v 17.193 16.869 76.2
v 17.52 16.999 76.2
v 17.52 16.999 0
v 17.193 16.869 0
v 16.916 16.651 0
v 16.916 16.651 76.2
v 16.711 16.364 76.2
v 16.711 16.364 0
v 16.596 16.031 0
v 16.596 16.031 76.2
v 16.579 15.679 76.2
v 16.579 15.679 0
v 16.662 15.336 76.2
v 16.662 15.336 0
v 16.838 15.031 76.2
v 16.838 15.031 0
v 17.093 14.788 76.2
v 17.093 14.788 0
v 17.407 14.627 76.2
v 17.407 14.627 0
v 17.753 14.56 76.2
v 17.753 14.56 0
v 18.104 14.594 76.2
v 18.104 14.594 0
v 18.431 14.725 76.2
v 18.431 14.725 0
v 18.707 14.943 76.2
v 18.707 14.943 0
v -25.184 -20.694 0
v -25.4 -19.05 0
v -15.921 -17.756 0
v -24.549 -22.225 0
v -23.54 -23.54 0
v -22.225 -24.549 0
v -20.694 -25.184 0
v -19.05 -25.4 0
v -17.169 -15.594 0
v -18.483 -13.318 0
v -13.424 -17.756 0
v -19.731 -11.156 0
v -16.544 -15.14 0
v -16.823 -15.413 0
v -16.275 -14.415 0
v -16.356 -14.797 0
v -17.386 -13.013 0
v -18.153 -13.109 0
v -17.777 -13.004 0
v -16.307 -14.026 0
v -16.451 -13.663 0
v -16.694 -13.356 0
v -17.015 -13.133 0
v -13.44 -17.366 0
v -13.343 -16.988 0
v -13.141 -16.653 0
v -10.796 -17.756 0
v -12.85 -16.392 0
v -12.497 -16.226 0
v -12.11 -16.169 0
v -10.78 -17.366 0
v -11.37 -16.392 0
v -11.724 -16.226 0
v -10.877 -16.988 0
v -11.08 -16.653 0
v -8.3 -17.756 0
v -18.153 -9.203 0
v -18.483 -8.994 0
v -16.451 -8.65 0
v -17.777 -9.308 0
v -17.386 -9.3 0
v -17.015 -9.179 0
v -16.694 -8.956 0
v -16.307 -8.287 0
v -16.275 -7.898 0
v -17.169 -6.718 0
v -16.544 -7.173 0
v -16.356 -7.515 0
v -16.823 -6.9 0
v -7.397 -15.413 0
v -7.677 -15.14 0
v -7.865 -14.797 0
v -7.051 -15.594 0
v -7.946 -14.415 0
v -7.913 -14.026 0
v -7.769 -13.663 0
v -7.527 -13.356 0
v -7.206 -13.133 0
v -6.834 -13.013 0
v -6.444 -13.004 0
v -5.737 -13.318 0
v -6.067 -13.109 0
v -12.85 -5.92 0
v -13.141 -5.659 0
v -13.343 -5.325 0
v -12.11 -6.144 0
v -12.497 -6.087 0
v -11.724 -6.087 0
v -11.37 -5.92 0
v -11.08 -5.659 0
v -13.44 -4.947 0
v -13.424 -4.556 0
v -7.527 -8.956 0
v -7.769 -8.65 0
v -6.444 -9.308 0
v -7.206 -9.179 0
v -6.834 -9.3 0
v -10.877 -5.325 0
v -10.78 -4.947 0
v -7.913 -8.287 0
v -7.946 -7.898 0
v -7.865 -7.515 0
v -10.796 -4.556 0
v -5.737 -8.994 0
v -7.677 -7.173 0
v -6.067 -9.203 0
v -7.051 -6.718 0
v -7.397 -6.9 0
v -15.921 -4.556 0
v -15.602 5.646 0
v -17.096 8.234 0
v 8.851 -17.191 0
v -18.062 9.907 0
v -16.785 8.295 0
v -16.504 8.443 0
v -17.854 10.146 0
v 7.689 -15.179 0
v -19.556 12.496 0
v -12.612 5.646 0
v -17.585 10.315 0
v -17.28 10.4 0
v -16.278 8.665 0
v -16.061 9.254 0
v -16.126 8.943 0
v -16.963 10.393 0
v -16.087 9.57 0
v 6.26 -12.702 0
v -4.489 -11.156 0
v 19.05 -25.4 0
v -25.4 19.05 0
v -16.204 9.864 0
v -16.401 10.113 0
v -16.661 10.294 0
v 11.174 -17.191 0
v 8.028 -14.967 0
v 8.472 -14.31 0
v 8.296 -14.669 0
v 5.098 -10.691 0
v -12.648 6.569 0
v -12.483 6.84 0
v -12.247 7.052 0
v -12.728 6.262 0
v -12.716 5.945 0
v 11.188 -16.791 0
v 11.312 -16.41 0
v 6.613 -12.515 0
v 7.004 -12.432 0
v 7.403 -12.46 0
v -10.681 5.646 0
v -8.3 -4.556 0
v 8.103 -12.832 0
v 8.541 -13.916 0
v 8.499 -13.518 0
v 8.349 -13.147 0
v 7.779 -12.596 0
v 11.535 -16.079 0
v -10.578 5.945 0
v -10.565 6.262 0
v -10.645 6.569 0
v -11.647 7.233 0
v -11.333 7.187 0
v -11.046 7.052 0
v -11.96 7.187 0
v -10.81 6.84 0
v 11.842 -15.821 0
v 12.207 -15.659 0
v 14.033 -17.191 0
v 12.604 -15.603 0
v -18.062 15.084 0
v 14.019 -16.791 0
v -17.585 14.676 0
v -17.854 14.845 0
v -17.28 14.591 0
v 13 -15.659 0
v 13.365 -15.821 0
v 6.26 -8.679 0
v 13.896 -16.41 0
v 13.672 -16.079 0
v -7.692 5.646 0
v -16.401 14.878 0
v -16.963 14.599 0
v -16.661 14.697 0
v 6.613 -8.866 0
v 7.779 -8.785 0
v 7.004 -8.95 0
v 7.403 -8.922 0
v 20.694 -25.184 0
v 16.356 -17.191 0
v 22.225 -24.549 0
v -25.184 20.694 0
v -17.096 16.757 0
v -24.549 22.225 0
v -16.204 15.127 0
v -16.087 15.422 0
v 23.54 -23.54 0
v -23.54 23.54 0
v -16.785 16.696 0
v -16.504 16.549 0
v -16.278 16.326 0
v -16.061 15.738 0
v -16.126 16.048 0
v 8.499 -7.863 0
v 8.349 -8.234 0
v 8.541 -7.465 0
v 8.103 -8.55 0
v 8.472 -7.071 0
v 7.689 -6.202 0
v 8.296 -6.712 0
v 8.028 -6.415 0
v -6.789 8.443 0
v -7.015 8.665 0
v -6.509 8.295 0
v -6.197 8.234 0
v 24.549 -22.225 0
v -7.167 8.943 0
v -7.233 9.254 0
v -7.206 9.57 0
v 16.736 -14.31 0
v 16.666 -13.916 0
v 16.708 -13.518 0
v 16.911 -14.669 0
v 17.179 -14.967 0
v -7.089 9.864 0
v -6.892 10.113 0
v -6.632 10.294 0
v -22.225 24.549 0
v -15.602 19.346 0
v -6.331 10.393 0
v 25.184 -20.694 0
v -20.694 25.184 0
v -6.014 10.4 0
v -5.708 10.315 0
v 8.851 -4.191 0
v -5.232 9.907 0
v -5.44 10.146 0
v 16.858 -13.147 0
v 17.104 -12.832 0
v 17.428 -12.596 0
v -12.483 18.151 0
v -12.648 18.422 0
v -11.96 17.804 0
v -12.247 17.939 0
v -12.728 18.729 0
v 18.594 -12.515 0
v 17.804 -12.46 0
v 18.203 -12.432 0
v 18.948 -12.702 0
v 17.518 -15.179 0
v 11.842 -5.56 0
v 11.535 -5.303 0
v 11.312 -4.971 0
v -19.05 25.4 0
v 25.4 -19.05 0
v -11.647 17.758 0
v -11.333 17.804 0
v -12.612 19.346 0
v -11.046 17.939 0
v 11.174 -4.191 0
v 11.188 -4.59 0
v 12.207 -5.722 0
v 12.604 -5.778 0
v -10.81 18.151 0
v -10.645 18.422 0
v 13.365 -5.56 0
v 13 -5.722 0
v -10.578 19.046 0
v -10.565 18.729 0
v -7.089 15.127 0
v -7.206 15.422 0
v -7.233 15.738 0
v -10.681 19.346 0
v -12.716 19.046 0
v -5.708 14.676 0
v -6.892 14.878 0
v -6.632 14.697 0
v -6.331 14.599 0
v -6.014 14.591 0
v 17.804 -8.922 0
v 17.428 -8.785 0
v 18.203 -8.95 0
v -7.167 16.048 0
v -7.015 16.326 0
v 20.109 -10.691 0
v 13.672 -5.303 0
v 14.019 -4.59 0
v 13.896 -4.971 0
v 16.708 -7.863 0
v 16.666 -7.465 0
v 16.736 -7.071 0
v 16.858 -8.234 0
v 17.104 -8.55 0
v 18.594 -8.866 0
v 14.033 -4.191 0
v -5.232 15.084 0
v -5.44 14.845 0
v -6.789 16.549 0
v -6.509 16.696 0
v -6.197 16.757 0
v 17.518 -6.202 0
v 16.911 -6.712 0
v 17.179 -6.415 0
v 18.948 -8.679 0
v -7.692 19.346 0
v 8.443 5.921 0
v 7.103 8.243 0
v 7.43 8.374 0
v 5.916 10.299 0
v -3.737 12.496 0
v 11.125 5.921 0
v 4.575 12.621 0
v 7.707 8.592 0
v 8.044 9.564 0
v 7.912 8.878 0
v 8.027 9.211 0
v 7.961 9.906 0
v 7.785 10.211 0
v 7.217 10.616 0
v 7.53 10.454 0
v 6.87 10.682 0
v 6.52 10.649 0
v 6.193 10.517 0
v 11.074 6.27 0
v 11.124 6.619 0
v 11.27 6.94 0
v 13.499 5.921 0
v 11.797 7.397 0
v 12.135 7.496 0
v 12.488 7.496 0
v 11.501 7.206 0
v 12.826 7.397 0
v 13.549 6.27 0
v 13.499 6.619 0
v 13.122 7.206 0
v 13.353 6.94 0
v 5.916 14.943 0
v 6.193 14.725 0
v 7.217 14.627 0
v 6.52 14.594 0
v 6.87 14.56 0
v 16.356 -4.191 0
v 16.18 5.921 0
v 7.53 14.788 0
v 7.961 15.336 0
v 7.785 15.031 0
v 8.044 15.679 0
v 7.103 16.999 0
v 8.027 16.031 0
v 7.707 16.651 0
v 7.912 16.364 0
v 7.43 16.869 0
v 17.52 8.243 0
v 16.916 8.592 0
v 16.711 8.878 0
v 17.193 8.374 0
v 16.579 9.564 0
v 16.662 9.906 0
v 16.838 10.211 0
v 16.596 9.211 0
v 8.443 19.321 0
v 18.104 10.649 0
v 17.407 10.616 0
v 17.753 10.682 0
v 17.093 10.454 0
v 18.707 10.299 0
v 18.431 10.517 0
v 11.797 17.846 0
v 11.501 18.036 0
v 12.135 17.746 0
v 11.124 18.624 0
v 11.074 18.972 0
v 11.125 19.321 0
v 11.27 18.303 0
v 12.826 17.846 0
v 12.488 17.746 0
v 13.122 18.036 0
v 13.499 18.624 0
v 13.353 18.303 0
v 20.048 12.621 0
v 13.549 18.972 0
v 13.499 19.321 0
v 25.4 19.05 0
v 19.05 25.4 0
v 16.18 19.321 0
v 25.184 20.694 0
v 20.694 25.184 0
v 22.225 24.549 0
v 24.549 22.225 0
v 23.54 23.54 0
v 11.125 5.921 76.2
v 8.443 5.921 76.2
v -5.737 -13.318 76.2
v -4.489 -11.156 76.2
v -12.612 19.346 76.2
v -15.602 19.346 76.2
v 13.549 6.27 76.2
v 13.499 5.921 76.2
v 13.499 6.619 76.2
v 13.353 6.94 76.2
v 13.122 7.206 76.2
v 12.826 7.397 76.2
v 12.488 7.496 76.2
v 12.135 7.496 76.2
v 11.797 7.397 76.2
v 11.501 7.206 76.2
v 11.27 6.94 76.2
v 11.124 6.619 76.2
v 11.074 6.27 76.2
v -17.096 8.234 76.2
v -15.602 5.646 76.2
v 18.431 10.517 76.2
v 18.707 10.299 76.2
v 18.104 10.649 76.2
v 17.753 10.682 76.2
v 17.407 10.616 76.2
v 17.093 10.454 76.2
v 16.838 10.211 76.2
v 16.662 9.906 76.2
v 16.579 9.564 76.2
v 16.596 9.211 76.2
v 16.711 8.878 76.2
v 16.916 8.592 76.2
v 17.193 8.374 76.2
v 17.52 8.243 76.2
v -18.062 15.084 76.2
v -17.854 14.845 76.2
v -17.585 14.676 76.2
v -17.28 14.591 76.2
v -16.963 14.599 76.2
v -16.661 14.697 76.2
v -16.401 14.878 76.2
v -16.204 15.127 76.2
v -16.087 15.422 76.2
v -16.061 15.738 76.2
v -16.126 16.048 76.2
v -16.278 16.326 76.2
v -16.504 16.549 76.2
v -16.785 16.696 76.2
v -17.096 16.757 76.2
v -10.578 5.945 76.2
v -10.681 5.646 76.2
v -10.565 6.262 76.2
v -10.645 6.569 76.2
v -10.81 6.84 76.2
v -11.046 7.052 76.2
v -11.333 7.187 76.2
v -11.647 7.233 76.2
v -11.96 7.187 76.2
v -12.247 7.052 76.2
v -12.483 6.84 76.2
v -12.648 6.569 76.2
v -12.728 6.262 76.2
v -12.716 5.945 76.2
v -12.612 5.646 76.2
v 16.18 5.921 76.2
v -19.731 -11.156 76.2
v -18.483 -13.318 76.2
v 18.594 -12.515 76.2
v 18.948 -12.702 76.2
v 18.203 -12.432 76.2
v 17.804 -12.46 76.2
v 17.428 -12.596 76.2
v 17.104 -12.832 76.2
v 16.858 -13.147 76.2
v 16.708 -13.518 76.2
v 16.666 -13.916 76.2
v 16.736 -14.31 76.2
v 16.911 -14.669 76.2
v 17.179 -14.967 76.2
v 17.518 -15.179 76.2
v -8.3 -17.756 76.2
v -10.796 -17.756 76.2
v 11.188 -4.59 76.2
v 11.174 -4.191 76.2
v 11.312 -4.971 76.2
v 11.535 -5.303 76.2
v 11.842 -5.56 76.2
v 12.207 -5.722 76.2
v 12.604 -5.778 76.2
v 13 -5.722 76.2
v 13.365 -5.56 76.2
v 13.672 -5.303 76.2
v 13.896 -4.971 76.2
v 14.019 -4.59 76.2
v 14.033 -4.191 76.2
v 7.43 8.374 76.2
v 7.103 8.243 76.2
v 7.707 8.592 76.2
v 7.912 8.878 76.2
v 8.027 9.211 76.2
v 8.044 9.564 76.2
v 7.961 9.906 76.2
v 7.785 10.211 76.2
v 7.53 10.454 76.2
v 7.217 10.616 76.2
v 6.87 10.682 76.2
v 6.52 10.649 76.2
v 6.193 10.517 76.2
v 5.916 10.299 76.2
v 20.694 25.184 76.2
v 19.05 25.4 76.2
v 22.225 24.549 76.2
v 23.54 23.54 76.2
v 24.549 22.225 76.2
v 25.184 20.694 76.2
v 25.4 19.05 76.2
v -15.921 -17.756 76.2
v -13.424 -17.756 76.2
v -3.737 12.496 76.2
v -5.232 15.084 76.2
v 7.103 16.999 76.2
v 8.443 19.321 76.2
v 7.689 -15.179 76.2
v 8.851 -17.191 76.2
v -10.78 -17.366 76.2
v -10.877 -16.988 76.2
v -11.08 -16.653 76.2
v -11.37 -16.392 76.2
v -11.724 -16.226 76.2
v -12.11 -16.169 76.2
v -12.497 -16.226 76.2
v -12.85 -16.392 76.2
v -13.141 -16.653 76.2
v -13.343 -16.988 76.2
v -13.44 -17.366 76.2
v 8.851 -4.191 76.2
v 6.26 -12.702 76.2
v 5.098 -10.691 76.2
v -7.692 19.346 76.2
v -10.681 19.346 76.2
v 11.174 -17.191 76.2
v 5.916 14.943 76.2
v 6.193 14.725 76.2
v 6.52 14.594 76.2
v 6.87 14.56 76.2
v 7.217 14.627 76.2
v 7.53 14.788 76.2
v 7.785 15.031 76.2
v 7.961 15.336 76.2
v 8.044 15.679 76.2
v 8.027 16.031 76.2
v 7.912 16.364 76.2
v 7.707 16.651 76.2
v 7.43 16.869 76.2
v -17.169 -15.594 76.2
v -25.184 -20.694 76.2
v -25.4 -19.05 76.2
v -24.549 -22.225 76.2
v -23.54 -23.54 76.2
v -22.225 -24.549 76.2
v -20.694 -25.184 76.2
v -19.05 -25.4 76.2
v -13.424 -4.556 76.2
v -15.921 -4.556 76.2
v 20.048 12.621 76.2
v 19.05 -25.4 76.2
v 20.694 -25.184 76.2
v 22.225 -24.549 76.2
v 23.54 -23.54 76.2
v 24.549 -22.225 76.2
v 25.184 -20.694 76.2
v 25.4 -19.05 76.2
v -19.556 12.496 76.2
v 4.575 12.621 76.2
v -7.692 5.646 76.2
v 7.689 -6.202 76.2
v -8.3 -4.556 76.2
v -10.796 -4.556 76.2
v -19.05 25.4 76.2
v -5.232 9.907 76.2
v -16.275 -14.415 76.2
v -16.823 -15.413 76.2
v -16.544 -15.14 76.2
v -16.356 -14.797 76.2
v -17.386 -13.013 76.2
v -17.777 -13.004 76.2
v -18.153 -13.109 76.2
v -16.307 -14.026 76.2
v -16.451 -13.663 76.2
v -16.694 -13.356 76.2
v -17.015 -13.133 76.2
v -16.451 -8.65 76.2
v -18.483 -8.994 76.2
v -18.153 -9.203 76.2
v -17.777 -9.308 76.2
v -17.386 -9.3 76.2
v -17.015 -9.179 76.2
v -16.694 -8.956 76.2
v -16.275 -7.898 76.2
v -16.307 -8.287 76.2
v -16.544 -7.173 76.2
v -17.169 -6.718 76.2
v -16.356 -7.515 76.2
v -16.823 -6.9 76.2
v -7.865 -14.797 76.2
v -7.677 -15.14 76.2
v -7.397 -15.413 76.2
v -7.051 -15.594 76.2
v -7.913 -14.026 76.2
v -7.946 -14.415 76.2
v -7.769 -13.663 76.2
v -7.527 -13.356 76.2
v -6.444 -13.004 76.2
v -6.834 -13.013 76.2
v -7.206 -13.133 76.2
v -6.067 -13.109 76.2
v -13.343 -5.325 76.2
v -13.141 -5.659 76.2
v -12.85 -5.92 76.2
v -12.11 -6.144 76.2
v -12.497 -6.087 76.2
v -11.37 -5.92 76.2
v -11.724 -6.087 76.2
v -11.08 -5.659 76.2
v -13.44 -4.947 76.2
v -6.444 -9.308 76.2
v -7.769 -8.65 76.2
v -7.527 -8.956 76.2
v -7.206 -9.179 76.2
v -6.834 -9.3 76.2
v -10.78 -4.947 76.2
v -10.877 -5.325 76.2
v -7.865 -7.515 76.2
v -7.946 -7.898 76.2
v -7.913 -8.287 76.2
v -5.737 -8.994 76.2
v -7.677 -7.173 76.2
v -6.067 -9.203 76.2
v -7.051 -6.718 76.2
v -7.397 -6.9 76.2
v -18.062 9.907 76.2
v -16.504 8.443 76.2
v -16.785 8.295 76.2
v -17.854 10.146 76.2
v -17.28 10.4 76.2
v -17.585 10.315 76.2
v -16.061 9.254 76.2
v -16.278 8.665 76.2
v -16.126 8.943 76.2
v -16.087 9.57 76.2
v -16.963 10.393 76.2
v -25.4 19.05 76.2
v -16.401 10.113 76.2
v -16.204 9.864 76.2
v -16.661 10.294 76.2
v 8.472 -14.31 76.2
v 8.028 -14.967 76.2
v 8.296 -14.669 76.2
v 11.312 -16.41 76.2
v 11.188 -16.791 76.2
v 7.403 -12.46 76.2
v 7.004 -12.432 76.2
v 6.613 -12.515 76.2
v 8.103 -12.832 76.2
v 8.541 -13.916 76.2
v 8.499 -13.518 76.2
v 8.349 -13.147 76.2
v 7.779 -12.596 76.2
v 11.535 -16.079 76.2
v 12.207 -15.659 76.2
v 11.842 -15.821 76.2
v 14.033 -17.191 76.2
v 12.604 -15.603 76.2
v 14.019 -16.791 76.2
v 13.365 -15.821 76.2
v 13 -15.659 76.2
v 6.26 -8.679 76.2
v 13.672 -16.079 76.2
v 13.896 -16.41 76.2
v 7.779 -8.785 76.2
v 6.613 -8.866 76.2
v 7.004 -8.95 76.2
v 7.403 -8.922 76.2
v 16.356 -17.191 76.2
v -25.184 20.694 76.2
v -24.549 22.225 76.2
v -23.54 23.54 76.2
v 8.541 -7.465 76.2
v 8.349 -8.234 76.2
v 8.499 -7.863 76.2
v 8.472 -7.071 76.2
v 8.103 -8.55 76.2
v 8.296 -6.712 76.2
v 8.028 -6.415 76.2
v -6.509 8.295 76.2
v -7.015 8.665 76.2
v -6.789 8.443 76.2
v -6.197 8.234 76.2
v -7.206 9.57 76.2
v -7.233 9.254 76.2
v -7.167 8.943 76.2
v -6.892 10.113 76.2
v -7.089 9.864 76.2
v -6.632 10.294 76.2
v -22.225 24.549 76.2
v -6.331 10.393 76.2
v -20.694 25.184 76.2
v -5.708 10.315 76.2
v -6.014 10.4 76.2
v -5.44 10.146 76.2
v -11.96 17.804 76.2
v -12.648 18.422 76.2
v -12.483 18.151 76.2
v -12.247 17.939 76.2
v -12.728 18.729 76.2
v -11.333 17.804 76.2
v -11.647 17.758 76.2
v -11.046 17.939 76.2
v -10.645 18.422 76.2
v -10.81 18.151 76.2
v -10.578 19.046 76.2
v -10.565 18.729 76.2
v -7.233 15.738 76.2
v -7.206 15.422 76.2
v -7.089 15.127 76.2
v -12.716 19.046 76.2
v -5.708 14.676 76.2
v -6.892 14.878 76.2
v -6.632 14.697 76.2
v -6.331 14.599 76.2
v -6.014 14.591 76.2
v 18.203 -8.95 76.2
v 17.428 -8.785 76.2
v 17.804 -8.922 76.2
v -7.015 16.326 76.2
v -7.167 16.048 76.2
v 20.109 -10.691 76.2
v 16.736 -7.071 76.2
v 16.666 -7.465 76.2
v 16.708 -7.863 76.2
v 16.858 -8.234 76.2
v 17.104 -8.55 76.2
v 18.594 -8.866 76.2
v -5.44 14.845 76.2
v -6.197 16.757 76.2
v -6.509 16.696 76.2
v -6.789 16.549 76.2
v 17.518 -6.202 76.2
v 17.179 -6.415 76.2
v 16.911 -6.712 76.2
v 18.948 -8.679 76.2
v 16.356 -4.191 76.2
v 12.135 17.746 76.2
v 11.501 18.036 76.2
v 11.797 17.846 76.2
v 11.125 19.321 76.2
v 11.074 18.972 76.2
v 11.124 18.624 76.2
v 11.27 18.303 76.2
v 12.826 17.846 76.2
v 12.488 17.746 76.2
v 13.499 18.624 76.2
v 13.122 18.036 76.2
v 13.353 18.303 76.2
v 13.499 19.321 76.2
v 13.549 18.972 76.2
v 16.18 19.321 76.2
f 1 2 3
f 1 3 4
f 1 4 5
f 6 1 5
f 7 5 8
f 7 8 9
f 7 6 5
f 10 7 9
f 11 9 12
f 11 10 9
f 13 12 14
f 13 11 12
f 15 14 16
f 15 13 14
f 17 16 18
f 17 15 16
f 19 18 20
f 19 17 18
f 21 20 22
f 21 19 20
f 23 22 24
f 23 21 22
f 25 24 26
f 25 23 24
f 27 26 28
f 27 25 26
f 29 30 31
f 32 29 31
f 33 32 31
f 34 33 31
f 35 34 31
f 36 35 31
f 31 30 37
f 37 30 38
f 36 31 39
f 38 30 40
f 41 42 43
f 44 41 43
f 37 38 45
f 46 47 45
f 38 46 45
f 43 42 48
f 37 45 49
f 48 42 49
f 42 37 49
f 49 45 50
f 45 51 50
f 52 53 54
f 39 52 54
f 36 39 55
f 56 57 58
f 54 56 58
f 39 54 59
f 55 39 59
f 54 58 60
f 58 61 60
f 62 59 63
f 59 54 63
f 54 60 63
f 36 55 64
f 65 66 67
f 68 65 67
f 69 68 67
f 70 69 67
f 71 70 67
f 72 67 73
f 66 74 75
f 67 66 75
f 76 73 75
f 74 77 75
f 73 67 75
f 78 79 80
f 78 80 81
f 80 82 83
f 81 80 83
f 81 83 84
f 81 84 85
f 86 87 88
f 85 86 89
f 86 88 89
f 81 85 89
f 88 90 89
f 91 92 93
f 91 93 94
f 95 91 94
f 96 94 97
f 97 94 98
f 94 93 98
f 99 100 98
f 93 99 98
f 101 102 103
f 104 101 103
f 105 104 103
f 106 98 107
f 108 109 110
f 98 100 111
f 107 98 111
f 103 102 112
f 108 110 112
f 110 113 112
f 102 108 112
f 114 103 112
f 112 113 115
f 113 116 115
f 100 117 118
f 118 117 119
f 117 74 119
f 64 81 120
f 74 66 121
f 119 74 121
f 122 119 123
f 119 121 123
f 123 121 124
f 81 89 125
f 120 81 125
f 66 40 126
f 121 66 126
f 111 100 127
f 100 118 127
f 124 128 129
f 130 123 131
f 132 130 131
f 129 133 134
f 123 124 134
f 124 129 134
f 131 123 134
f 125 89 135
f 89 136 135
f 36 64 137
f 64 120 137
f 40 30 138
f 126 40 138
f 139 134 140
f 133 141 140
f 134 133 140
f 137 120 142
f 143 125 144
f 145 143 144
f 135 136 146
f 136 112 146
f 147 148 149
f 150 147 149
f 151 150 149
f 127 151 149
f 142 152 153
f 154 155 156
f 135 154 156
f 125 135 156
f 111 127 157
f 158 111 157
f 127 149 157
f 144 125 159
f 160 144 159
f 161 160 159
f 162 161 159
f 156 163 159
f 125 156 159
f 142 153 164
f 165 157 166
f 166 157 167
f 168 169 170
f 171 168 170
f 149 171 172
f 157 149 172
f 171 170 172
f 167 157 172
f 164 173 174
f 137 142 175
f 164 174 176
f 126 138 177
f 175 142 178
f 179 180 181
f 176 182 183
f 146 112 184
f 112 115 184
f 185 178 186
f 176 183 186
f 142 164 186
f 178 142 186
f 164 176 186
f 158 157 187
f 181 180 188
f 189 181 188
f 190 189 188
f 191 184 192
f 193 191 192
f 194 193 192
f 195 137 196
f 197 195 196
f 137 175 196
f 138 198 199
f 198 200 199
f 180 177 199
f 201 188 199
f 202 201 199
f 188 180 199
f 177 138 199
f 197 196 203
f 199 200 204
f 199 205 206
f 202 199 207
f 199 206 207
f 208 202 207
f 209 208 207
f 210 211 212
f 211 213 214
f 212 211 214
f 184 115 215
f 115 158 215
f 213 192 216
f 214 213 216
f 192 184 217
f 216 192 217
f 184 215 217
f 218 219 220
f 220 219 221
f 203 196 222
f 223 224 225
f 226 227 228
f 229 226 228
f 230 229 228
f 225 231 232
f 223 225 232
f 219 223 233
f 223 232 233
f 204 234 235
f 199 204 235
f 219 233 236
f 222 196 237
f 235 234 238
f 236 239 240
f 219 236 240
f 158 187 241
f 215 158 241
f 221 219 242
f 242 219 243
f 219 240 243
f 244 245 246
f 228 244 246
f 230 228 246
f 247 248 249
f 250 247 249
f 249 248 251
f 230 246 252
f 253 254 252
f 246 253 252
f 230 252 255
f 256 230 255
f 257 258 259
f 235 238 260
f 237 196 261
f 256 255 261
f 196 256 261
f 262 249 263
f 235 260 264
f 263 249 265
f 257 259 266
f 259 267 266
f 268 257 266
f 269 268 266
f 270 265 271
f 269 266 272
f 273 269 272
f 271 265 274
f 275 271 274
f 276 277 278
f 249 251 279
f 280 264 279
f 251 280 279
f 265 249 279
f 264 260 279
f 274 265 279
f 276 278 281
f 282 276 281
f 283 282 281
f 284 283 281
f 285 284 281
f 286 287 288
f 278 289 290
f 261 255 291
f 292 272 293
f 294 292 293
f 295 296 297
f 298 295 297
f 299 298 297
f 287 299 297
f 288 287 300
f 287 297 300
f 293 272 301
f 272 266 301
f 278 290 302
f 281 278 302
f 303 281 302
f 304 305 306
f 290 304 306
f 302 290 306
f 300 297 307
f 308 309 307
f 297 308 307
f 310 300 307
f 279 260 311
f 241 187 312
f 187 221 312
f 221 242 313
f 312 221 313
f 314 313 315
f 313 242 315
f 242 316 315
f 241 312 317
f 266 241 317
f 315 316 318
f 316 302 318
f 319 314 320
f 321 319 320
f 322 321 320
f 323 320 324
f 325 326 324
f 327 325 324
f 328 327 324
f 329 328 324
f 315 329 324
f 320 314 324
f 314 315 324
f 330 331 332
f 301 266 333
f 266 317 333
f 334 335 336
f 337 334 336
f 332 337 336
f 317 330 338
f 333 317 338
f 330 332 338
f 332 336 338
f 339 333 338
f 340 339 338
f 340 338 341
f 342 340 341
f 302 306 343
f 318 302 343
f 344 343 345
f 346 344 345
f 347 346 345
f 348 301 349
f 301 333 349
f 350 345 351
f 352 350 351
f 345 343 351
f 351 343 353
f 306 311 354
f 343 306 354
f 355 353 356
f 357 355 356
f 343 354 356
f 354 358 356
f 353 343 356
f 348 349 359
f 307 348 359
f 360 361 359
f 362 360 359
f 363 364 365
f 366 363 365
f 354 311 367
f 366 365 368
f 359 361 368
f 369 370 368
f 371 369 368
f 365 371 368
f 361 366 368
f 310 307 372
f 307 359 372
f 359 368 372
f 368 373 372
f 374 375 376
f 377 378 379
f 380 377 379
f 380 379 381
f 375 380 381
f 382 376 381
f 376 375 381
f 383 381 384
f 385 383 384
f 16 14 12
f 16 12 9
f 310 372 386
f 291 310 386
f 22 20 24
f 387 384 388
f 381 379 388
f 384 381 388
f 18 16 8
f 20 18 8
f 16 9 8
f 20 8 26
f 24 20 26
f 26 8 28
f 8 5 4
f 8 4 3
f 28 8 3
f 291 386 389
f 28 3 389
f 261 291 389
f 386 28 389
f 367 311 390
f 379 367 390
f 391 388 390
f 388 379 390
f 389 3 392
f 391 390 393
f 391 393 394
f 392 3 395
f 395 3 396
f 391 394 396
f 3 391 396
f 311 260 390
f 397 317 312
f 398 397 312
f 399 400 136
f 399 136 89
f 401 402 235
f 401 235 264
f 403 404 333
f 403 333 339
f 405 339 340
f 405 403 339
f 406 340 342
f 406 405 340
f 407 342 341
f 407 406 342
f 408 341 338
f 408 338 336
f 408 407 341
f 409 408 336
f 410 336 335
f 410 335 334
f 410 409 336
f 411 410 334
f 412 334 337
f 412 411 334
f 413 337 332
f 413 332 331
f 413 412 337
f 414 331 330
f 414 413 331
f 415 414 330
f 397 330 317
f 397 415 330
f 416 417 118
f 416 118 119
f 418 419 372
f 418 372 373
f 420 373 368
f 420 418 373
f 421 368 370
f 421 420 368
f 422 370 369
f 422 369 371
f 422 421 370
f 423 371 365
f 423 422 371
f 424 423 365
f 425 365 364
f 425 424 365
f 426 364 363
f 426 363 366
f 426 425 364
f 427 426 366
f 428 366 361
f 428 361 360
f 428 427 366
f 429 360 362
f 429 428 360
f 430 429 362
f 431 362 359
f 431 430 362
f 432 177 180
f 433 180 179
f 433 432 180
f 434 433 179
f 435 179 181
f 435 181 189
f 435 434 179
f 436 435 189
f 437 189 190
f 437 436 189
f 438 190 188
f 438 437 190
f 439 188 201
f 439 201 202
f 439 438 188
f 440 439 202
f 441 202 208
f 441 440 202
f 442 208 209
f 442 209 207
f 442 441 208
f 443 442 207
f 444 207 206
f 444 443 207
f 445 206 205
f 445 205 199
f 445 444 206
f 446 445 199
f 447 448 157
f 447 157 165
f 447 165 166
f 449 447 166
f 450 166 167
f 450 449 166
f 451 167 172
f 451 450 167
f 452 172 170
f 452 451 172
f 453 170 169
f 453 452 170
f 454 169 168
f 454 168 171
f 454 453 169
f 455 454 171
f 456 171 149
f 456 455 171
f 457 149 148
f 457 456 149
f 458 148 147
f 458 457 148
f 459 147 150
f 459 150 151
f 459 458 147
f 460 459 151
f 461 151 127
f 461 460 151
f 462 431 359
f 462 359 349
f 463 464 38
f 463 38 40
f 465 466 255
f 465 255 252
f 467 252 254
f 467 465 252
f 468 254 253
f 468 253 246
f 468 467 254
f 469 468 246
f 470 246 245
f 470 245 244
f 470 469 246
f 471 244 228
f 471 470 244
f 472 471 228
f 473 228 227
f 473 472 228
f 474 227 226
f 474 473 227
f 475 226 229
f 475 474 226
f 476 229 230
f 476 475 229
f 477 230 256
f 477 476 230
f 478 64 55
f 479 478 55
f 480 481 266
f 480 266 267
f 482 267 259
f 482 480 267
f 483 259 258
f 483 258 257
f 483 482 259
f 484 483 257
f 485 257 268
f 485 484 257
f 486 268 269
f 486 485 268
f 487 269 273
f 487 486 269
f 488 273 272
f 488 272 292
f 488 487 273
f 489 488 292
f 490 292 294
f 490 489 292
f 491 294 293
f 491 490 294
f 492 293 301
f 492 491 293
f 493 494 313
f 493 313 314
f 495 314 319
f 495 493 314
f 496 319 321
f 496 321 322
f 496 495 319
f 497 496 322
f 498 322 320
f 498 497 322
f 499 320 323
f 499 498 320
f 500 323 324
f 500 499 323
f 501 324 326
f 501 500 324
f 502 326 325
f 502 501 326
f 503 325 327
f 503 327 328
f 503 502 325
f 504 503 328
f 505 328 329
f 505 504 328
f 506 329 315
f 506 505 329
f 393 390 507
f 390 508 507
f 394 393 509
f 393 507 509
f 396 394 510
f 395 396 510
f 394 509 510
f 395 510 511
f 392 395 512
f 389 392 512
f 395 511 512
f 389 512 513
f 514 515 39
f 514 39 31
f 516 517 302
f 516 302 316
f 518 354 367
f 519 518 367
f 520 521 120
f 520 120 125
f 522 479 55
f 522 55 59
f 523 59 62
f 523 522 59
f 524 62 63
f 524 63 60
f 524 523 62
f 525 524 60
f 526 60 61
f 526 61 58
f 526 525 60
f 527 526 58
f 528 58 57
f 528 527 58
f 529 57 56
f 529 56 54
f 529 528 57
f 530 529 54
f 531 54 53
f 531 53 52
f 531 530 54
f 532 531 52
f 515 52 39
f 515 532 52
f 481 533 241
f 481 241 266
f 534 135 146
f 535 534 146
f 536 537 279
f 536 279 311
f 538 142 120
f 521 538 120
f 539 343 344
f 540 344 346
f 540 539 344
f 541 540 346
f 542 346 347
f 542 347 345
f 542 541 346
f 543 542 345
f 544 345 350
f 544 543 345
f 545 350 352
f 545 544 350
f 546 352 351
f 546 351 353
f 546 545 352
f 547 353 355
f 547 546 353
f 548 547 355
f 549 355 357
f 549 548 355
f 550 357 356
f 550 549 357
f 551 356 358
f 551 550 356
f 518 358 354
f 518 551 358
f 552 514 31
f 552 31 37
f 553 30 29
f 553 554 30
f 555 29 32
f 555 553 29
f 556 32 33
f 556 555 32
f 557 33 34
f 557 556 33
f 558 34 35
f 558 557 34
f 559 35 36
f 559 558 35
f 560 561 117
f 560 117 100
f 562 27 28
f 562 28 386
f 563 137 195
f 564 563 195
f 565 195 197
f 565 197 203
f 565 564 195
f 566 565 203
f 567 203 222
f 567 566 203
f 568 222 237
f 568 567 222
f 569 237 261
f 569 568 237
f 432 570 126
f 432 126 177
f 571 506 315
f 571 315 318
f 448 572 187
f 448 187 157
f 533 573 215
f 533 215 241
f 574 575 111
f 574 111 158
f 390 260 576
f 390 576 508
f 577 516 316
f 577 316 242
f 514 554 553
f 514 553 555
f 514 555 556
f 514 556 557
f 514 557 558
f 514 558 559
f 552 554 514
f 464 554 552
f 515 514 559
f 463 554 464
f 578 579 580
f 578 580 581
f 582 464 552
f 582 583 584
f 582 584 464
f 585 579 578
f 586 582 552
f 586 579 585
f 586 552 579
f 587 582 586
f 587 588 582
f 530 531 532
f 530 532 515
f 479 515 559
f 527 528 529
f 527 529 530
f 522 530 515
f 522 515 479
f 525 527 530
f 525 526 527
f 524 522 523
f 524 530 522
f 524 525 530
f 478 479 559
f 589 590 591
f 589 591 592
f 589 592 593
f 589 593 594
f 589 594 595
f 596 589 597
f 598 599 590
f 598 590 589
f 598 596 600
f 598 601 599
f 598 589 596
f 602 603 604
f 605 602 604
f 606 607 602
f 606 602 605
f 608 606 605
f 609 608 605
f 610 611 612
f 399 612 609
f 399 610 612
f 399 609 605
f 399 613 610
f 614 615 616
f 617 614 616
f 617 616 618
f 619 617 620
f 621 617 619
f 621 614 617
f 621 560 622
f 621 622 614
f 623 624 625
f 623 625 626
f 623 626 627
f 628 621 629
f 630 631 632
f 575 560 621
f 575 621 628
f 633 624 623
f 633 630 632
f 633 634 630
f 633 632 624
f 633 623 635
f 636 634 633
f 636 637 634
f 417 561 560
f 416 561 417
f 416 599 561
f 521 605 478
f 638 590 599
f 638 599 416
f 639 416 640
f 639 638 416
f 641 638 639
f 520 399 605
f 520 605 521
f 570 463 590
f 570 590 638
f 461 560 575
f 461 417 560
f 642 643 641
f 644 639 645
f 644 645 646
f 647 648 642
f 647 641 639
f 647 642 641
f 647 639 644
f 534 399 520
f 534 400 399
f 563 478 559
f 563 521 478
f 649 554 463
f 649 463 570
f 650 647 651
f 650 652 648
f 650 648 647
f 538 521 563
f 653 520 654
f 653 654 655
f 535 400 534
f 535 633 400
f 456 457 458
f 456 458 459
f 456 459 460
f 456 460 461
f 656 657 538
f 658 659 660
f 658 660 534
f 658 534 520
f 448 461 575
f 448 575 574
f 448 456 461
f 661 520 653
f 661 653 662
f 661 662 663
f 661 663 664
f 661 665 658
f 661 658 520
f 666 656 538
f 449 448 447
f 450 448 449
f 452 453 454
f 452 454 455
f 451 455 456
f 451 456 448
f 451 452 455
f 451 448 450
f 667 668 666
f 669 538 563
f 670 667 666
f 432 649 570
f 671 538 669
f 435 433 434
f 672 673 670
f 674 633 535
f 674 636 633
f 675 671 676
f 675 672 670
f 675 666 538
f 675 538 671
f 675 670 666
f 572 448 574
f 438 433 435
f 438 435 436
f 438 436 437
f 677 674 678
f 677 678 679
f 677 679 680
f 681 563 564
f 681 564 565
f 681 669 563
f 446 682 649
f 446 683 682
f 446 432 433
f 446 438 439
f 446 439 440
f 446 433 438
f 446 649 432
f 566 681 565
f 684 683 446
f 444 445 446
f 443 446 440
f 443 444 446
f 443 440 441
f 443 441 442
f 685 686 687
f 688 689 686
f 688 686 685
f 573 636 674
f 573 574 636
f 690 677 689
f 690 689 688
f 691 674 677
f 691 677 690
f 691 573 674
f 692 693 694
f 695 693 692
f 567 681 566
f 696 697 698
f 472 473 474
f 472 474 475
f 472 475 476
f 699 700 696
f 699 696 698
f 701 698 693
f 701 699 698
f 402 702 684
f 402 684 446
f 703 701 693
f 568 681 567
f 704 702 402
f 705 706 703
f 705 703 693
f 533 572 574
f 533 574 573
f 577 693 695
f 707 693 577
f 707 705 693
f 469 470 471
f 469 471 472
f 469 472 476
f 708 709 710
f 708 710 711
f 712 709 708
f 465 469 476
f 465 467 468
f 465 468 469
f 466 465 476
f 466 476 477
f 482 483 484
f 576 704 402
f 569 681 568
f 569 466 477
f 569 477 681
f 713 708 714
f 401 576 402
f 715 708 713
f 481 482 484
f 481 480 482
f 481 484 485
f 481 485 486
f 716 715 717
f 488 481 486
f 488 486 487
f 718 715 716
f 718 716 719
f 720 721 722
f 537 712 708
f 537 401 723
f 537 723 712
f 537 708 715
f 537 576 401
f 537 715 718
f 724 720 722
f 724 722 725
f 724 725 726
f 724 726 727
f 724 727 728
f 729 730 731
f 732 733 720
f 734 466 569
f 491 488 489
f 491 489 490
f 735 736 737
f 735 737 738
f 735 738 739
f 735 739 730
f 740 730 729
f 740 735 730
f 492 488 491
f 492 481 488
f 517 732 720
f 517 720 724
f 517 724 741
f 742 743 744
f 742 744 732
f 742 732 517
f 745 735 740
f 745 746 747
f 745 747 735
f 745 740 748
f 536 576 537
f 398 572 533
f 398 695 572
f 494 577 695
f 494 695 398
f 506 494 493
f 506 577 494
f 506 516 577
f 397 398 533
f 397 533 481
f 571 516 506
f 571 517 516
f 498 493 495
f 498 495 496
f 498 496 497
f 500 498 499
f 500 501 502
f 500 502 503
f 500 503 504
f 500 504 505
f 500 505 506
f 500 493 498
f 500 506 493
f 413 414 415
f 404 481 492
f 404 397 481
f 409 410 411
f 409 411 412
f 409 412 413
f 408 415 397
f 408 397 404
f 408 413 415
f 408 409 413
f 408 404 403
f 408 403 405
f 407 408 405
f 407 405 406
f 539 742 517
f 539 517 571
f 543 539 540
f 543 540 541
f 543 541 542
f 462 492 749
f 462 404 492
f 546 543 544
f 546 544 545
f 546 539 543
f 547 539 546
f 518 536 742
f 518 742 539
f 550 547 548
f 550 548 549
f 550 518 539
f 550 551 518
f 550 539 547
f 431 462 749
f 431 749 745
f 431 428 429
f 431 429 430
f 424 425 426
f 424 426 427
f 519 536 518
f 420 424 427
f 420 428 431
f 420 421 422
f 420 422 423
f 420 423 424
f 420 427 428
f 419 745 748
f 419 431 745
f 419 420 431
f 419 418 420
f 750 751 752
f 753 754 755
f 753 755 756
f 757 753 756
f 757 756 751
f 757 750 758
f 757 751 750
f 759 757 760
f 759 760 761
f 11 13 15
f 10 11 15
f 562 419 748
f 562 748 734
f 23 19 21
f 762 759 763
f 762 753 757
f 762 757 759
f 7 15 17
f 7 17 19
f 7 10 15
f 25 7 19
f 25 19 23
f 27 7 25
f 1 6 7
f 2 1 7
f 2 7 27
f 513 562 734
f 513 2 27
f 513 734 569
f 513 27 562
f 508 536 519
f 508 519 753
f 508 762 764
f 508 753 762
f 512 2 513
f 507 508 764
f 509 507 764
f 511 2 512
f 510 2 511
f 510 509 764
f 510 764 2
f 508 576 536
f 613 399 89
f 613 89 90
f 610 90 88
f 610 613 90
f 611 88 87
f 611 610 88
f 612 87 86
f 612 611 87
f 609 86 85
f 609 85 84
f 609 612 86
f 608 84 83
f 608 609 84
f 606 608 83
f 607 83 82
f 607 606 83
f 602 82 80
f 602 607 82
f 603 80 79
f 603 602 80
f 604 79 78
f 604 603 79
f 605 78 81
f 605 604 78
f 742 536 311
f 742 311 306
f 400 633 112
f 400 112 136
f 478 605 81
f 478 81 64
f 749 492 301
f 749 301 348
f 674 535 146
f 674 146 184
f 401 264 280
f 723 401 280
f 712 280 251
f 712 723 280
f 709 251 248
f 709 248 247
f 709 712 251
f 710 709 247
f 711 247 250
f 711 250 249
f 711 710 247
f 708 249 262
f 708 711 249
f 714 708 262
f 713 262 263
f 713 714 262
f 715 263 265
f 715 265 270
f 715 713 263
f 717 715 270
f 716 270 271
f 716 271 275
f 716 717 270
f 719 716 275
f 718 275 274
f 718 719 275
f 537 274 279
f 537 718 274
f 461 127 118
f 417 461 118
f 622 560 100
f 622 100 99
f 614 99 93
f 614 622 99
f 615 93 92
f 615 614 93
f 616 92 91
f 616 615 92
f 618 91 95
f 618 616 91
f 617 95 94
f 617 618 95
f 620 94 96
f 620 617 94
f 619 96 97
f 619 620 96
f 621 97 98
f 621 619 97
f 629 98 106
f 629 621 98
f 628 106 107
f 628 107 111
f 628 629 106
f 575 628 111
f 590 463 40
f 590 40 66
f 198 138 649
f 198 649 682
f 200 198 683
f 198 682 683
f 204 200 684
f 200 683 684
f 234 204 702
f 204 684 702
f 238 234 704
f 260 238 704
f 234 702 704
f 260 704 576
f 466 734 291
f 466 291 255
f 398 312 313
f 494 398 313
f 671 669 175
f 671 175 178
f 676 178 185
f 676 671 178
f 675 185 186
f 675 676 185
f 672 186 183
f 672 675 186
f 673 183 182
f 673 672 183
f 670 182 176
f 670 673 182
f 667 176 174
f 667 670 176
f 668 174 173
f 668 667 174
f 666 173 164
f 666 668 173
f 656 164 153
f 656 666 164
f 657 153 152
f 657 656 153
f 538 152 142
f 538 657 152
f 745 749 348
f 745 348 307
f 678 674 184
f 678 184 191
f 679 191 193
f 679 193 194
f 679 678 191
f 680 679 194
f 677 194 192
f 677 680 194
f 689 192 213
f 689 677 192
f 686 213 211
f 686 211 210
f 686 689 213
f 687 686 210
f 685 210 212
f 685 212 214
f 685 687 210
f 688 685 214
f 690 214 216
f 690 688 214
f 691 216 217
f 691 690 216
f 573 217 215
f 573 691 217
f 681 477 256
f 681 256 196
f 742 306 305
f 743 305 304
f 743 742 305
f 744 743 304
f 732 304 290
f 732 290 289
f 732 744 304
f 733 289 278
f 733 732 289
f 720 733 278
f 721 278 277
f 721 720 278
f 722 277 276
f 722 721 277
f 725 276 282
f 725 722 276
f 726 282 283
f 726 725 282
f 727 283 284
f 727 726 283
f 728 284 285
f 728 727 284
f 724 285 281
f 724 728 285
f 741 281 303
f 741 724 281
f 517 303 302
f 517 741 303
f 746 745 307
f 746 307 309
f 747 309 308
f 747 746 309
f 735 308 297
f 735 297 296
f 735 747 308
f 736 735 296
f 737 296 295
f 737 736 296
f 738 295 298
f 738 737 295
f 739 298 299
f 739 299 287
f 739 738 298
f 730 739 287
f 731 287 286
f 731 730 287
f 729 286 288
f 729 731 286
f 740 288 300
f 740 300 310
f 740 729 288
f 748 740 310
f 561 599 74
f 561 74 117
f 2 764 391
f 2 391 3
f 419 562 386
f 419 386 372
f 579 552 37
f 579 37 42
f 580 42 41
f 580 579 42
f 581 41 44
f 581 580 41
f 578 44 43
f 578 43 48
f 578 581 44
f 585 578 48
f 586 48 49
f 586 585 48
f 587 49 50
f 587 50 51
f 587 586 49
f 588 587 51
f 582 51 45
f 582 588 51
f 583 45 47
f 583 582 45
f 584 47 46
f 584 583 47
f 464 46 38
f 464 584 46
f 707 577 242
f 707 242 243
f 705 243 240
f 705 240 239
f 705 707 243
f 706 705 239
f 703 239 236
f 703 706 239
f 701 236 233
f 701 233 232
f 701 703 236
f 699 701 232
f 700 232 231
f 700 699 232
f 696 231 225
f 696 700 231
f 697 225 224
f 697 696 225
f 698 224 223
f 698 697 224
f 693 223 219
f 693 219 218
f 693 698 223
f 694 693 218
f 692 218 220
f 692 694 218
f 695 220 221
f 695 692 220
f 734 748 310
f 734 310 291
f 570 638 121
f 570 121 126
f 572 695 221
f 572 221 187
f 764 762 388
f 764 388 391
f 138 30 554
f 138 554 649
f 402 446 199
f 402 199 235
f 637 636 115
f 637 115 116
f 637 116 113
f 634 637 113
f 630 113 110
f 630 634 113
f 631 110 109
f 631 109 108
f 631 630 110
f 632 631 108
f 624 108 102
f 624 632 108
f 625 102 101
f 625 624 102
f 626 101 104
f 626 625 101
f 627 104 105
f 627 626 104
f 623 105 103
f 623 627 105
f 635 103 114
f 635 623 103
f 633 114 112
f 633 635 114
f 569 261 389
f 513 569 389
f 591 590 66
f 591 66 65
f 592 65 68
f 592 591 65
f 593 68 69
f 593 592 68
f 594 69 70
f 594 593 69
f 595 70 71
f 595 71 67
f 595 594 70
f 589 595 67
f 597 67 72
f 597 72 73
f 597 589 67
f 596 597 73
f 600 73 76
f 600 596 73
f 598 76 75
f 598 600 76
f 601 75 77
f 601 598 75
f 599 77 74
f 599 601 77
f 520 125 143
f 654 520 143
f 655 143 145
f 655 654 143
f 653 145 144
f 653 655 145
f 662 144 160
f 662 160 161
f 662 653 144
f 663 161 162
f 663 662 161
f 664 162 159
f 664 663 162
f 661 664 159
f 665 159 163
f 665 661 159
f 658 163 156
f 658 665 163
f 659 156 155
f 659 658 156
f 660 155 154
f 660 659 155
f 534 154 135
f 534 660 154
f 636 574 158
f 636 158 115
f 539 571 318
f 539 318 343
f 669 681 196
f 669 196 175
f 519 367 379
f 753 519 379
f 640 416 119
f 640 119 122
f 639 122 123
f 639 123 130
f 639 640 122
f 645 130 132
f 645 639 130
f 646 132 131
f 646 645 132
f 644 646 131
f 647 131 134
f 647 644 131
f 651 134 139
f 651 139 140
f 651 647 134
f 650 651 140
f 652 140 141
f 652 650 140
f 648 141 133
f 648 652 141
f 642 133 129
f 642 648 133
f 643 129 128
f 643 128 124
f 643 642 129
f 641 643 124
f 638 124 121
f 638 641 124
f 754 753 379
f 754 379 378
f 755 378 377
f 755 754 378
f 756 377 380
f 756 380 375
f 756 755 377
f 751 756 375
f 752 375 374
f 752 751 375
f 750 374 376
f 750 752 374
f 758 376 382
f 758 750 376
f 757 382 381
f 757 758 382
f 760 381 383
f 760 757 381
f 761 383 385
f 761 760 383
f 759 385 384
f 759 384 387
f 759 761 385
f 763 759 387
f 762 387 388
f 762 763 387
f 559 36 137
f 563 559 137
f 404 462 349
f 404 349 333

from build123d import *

# Parameters (mm, degrees)
SKETCH1_W               = 50.8
SKETCH1_H               = 50.8
BOSS_EXTRUDE1_DEPTH     = 76.2
CUT_EXTRUDE_THIN1_DEPTH = 76.2
CUT_EXTRUDE_THIN3_DEPTH = 76.2
CUT_EXTRUDE_THIN4_DEPTH = 76.2
CUT_EXTRUDE_THIN5_DEPTH = 76.2
FILLET1_R               = 6.35


with BuildPart() as part:
    # Sketch1 → Boss-Extrude1 (new body)
    with BuildSketch(Plane.XY):
        Rectangle(SKETCH1_W, SKETCH1_H)
    extrude(amount=BOSS_EXTRUDE1_DEPTH)

    # Sketch3 → Cut-Extrude-Thin1 (cut)
    with BuildSketch(Plane.XY.offset(76.2)):
        with BuildLine():
            Line((-12.612425978, 5.645622006), (-15.601534006, 5.645622006))
            Line((-15.601534006, 5.645622006), (-17.096088177, 8.234265403))
            ThreePointArc((-17.096088177, 8.234265403), (-16.204143595, 9.864371952), (-18.061829574, 9.906978335))
            Line((-18.061829574, 9.906978335), (-19.556383755, 12.495621749))
            Line((-19.556383755, 12.495621749), (-18.061829888, 15.084265344))
            ThreePointArc((-18.061829888, 15.084265344), (-16.204143914, 15.126871952), (-17.096088694, 16.756978394))
            Line((-17.096088694, 16.756978394), (-15.601534816, 19.345622006))
            Line((-15.601534816, 19.345622006), (-12.612426748, 19.345622006))
            ThreePointArc((-12.612426748, 19.345622006), (-11.646685452, 17.758122006), (-10.680944156, 19.345622006))
            Line((-10.680944156, 19.345622006), (-7.691836108, 19.345622006))
            Line((-7.691836108, 19.345622006), (-6.197282084, 16.756978502))
            ThreePointArc((-6.197282084, 16.756978502), (-7.08922655, 15.126871634), (-5.231540325, 15.084266234))
            Line((-5.231540325, 15.084266234), (-3.736985995, 12.495622199))
            Line((-3.736985995, 12.495622199), (-5.231540019, 9.906978694))
            ThreePointArc((-5.231540019, 9.906978694), (-7.089225995, 9.864372199), (-6.197281314, 8.234265703))
            Line((-6.197281314, 8.234265703), (-7.691835339, 5.645622199))
            Line((-7.691835339, 5.645622199), (-10.680943287, 5.645622199))
            ThreePointArc((-10.680943287, 5.645622199), (-11.646684791, 7.233122006), (-12.612425978, 5.645622006))
        make_face()
        with BuildLine():
            Line((-13.234184683, 6.145622006), (-15.312858892, 6.145622006))
            Line((-15.312858892, 6.145622006), (-16.352196106, 7.945806615))
            ThreePointArc((-16.352196106, 7.945806615), (-15.771130909, 10.114371978), (-17.939696272, 10.695437176))
            Line((-17.939696272, 10.695437176), (-18.979033486, 12.495621784))
            Line((-18.979033486, 12.495621784), (-17.93969649, 14.295806519))
            ThreePointArc((-17.93969649, 14.295806519), (-15.771131197, 14.876871978), (-16.352196657, 17.045437272))
            Line((-16.352196657, 17.045437272), (-15.312859661, 18.845622006))
            Line((-15.312859661, 18.845622006), (-13.234185452, 18.845622006))
            ThreePointArc((-13.234185452, 18.845622006), (-11.646685452, 17.258122006), (-10.059185452, 18.845622006))
            Line((-10.059185452, 18.845622006), (-7.980511243, 18.845622006))
            Line((-7.980511243, 18.845622006), (-6.941174138, 17.045437335))
            ThreePointArc((-6.941174138, 17.045437335), (-7.522239276, 14.876871676), (-5.353673478, 14.295807059))
            Line((-5.353673478, 14.295807059), (-4.314336264, 12.495622199))
            Line((-4.314336264, 12.495622199), (-5.353673369, 10.695437527))
            ThreePointArc((-5.353673369, 10.695437527), (-7.522238697, 10.114372199), (-6.941173369, 7.94580687))
            Line((-6.941173369, 7.94580687), (-7.980510473, 6.145622199))
            Line((-7.980510473, 6.145622199), (-10.059184683, 6.145622199))
            ThreePointArc((-10.059184683, 6.145622199), (-11.646684779, 7.733122006), (-13.234184683, 6.145622006))
        make_face(mode=Mode.SUBTRACT)
    extrude(amount=-CUT_EXTRUDE_THIN1_DEPTH, mode=Mode.SUBTRACT)


with BuildPart() as body_2:
    # of the pieces the cut leaves, the one that is kept (cut_extrude_thin1_keep)
    add(part.part.solids().sort_by_distance((-25.4, 25.4, 0))[0])

    # Sketch8 → Cut-Extrude-Thin3 (cut)
    with BuildSketch(Plane.XY.offset(76.2)):
        with BuildLine():
            Line((11.124642482, 5.92120821), (8.443369261, 5.92120821))
            Line((8.443369261, 5.92120821), (7.102732509, 8.243258853))
            ThreePointArc((7.102732509, 8.243258853), (7.884060943, 10.064958164), (5.915758817, 10.299157308))
            Line((5.915758817, 10.299157308), (4.575122058, 12.621207963))
            Line((4.575122058, 12.621207963), (5.915758536, 14.943258781))
            ThreePointArc((5.915758536, 14.943258781), (7.884060634, 15.177458164), (7.102731978, 16.99915738))
            Line((7.102731978, 16.99915738), (8.443368463, 19.32120821))
            Line((8.443368463, 19.32120821), (11.124641713, 19.32120821))
            ThreePointArc((11.124641713, 19.32120821), (12.311615281, 17.73370821), (13.498588848, 19.32120821))
            Line((13.498588848, 19.32120821), (16.179862084, 19.32120821))
            Line((16.179862084, 19.32120821), (17.520498702, 16.999157473))
            ThreePointArc((17.520498702, 16.999157473), (16.739170356, 15.177457866), (18.707472818, 14.943259523))
            Line((18.707472818, 14.943259523), (20.048109657, 12.621208402))
            Line((20.048109657, 12.621208402), (18.707473039, 10.299157665))
            ThreePointArc((18.707473039, 10.299157665), (16.739170927, 10.064958402), (17.520499472, 8.243259139))
            Line((17.520499472, 8.243259139), (16.179862854, 5.921208402))
            Line((16.179862854, 5.921208402), (13.498589674, 5.921208402))
            ThreePointArc((13.498589674, 5.921208402), (12.31161595, 7.50870821), (11.124642482, 5.92120821))
        make_face()
        with BuildLine():
            Line((10.72411605, 6.27120821), (8.645441841, 6.27120821))
            Line((8.645441841, 6.27120821), (7.606104627, 8.071392818))
            ThreePointArc((7.606104627, 8.071392818), (8.187169824, 10.239958182), (6.01860446, 10.821023379))
            Line((6.01860446, 10.821023379), (4.979267247, 12.621207988))
            Line((4.979267247, 12.621207988), (6.018604242, 14.421392722))
            ThreePointArc((6.018604242, 14.421392722), (8.187169536, 15.002458182), (7.606104076, 17.171023475))
            Line((7.606104076, 17.171023475), (8.645441071, 18.97120821))
            Line((8.645441071, 18.97120821), (10.724115281, 18.97120821))
            ThreePointArc((10.724115281, 18.97120821), (12.311615281, 17.38370821), (13.899115281, 18.97120821))
            Line((13.899115281, 18.97120821), (15.97778949, 18.97120821))
            Line((15.97778949, 18.97120821), (17.017126595, 17.171023538))
            ThreePointArc((17.017126595, 17.171023538), (16.436061457, 15.00245788), (18.604627255, 14.421393263))
            Line((18.604627255, 14.421393263), (19.643964469, 12.621208402))
            Line((19.643964469, 12.621208402), (18.604627364, 10.821023731))
            ThreePointArc((18.604627364, 10.821023731), (16.436062036, 10.239958402), (17.017127364, 8.071393074))
            Line((17.017127364, 8.071393074), (15.977790259, 6.271208402))
            Line((15.977790259, 6.271208402), (13.89911605, 6.271208402))
            ThreePointArc((13.89911605, 6.271208402), (12.311615954, 7.85870821), (10.72411605, 6.27120821))
        make_face(mode=Mode.SUBTRACT)
    extrude(amount=-CUT_EXTRUDE_THIN3_DEPTH, mode=Mode.SUBTRACT)


with BuildPart() as body_2_2:
    # of the pieces the cut leaves, the one that is kept (cut_extrude_thin3_keep)
    add(body_2.part.solids().sort_by_distance((-25.4, 25.4, 0))[0])

    # Sketch7 → Cut-Extrude-Thin4 (cut)
    with BuildSketch(Plane.XY.offset(76.2)):
        with BuildLine():
            Line((-13.424079874, -17.756295509), (-15.920663846, -17.756295509))
            Line((-15.920663846, -17.756295509), (-17.168955962, -15.594190442))
            ThreePointArc((-17.168955962, -15.594190442), (-16.451104648, -13.662545549), (-18.482883895, -13.318400823))
            Line((-18.482883895, -13.318400823), (-19.731176017, -11.156295748))
            Line((-19.731176017, -11.156295748), (-18.482884157, -8.994190522))
            ThreePointArc((-18.482884157, -8.994190522), (-16.451104952, -8.650045549), (-17.1689565, -6.718400744))
            Line((-17.1689565, -6.718400744), (-15.920664635, -4.556295509))
            Line((-15.920664635, -4.556295509), (-13.424080643, -4.556295509))
            ThreePointArc((-13.424080643, -4.556295509), (-12.110152848, -6.143795509), (-10.796225054, -4.556295509))
            Line((-10.796225054, -4.556295509), (-8.299641072, -4.556295509))
            Line((-8.299641072, -4.556295509), (-7.051349081, -6.71840066))
            ThreePointArc((-7.051349081, -6.71840066), (-7.769200318, -8.650045845), (-5.737420698, -8.994189851))
            Line((-5.737420698, -8.994189851), (-4.489128526, -11.156295316))
            Line((-4.489128526, -11.156295316), (-5.737420517, -13.318400467))
            ThreePointArc((-5.737420517, -13.318400467), (-7.769199743, -13.662545316), (-7.051348312, -15.594190165))
            Line((-7.051348312, -15.594190165), (-8.299640302, -17.756295316))
            Line((-8.299640302, -17.756295316), (-10.796224248, -17.756295316))
            ThreePointArc((-10.796224248, -17.756295316), (-12.110152177, -16.168795509), (-13.424079874, -17.756295509))
        make_face()
        with BuildLine():
            Line((-13.697652079, -17.506295509), (-15.776326288, -17.506295509))
            Line((-15.776326288, -17.506295509), (-16.815663502, -15.7061109))
            ThreePointArc((-16.815663502, -15.7061109), (-16.234598305, -13.537545536), (-18.403163669, -12.956480339))
            Line((-18.403163669, -12.956480339), (-19.442500882, -11.156295731))
            Line((-19.442500882, -11.156295731), (-18.403163887, -9.356110996))
            ThreePointArc((-18.403163887, -9.356110996), (-16.234598594, -8.775045536), (-16.815664053, -6.606480243))
            Line((-16.815664053, -6.606480243), (-15.776327058, -4.806295509))
            Line((-15.776327058, -4.806295509), (-13.697652848, -4.806295509))
            ThreePointArc((-13.697652848, -4.806295509), (-12.110152848, -6.393795509), (-10.522652848, -4.806295509))
            Line((-10.522652848, -4.806295509), (-8.443978639, -4.806295509))
            Line((-8.443978639, -4.806295509), (-7.404641534, -6.60648018))
            ThreePointArc((-7.404641534, -6.60648018), (-7.985706672, -8.775045839), (-5.817140874, -9.356110456))
            Line((-5.817140874, -9.356110456), (-4.77780366, -11.156295316))
            Line((-4.77780366, -11.156295316), (-5.817140765, -12.956479988))
            ThreePointArc((-5.817140765, -12.956479988), (-7.985706094, -13.537545316), (-7.404640765, -15.706110645))
            Line((-7.404640765, -15.706110645), (-8.44397787, -17.506295316))
            Line((-8.44397787, -17.506295316), (-10.522652079, -17.506295316))
            ThreePointArc((-10.522652079, -17.506295316), (-12.110152175, -15.918795509), (-13.697652079, -17.506295509))
        make_face(mode=Mode.SUBTRACT)
    extrude(amount=-CUT_EXTRUDE_THIN4_DEPTH, mode=Mode.SUBTRACT)


with BuildPart() as body_2_3:
    # of the pieces the cut leaves, the one that is kept (cut_extrude_thin4_keep)
    add(body_2_2.part.solids().sort_by_distance((-25.4, 25.4, 0))[0])

    # Sketch9 → Cut-Extrude-Thin5 (cut)
    with BuildSketch(Plane.XY.offset(76.2)):
        with BuildLine():
            Line((11.173933507, -17.190560255), (8.850809256, -17.190560255))
            Line((8.850809256, -17.190560255), (7.689247009, -15.178675708))
            ThreePointArc((7.689247009, -15.178675708), (8.349235968, -13.146810291), (6.259594366, -12.70244504))
            Line((6.259594366, -12.70244504), (5.098032116, -10.690560488))
            Line((5.098032116, -10.690560488), (6.259594122, -8.678675795))
            ThreePointArc((6.259594122, -8.678675795), (8.34923567, -8.234310291), (7.689246465, -6.202444953))
            Line((7.689246465, -6.202444953), (8.850808475, -4.190560255))
            Line((8.850808475, -4.190560255), (11.173932738, -4.190560255))
            ThreePointArc((11.173932738, -4.190560255), (12.60358523, -5.778060255), (14.033237723, -4.190560255))
            Line((14.033237723, -4.190560255), (16.35636198, -4.190560255))
            Line((16.35636198, -4.190560255), (17.517924109, -6.202444878))
            ThreePointArc((17.517924109, -6.202444878), (16.857935218, -8.234310587), (18.947577222, -8.678675182))
            Line((18.947577222, -8.678675182), (20.109139499, -10.690560063))
            Line((20.109139499, -10.690560063), (18.947577371, -12.702444685))
            ThreePointArc((18.947577371, -12.702444685), (16.857935796, -13.146810063), (17.517924878, -15.17867544))
            Line((17.517924878, -15.17867544), (16.35636275, -17.190560063))
            Line((16.35636275, -17.190560063), (14.033238513, -17.190560063))
            ThreePointArc((14.033238513, -17.190560063), (12.603585903, -15.603060255), (11.173933507, -17.190560255))
        make_face()
        with BuildLine():
            Line((11.016086, -17.040560255), (8.93741179, -17.040560255))
            Line((8.93741179, -17.040560255), (7.898074577, -15.240375647))
            ThreePointArc((7.898074577, -15.240375647), (8.479139774, -13.071810283), (6.31057441, -12.490745086))
            Line((6.31057441, -12.490745086), (5.271237196, -10.690560477))
            Line((5.271237196, -10.690560477), (6.310574192, -8.890375743))
            ThreePointArc((6.310574192, -8.890375743), (8.479139485, -8.309310283), (7.898074025, -6.14074499))
            Line((7.898074025, -6.14074499), (8.937411021, -4.340560255))
            Line((8.937411021, -4.340560255), (11.01608523, -4.340560255))
            ThreePointArc((11.01608523, -4.340560255), (12.60358523, -5.928060255), (14.19108523, -4.340560255))
            Line((14.19108523, -4.340560255), (16.26975944, -4.340560255))
            Line((16.26975944, -4.340560255), (17.309096544, -6.140744927))
            ThreePointArc((17.309096544, -6.140744927), (16.728031407, -8.309310585), (18.896597205, -8.890375202))
            Line((18.896597205, -8.890375202), (19.935934418, -10.690560063))
            Line((19.935934418, -10.690560063), (18.896597314, -12.490744734))
            ThreePointArc((18.896597314, -12.490744734), (16.728031985, -13.071810063), (17.309097314, -15.240375391))
            Line((17.309097314, -15.240375391), (16.269760209, -17.040560063))
            Line((16.269760209, -17.040560063), (14.191086, -17.040560063))
            ThreePointArc((14.191086, -17.040560063), (12.603585904, -15.453060255), (11.016086, -17.040560255))
        make_face(mode=Mode.SUBTRACT)
    extrude(amount=-CUT_EXTRUDE_THIN5_DEPTH, mode=Mode.SUBTRACT)


with BuildPart() as body_2_4:
    # of the pieces the cut leaves, the one that is kept (cut_extrude_thin5_keep)
    add(body_2_3.part.solids().sort_by_distance((-25.4, 25.4, 0))[0])

    # Fillet1
    fillet1_edges = [body_2_4.edges().sort_by_distance(p)[0] for p in [
        (25.4, -25.4, 38.1),
        (25.4, 25.4, 38.1),
        (-25.4, 25.4, 38.1),
        (-25.4, -25.4, 38.1),
    ]]
    fillet(fillet1_edges, radius=FILLET1_R)


solid = body_2_4.part
